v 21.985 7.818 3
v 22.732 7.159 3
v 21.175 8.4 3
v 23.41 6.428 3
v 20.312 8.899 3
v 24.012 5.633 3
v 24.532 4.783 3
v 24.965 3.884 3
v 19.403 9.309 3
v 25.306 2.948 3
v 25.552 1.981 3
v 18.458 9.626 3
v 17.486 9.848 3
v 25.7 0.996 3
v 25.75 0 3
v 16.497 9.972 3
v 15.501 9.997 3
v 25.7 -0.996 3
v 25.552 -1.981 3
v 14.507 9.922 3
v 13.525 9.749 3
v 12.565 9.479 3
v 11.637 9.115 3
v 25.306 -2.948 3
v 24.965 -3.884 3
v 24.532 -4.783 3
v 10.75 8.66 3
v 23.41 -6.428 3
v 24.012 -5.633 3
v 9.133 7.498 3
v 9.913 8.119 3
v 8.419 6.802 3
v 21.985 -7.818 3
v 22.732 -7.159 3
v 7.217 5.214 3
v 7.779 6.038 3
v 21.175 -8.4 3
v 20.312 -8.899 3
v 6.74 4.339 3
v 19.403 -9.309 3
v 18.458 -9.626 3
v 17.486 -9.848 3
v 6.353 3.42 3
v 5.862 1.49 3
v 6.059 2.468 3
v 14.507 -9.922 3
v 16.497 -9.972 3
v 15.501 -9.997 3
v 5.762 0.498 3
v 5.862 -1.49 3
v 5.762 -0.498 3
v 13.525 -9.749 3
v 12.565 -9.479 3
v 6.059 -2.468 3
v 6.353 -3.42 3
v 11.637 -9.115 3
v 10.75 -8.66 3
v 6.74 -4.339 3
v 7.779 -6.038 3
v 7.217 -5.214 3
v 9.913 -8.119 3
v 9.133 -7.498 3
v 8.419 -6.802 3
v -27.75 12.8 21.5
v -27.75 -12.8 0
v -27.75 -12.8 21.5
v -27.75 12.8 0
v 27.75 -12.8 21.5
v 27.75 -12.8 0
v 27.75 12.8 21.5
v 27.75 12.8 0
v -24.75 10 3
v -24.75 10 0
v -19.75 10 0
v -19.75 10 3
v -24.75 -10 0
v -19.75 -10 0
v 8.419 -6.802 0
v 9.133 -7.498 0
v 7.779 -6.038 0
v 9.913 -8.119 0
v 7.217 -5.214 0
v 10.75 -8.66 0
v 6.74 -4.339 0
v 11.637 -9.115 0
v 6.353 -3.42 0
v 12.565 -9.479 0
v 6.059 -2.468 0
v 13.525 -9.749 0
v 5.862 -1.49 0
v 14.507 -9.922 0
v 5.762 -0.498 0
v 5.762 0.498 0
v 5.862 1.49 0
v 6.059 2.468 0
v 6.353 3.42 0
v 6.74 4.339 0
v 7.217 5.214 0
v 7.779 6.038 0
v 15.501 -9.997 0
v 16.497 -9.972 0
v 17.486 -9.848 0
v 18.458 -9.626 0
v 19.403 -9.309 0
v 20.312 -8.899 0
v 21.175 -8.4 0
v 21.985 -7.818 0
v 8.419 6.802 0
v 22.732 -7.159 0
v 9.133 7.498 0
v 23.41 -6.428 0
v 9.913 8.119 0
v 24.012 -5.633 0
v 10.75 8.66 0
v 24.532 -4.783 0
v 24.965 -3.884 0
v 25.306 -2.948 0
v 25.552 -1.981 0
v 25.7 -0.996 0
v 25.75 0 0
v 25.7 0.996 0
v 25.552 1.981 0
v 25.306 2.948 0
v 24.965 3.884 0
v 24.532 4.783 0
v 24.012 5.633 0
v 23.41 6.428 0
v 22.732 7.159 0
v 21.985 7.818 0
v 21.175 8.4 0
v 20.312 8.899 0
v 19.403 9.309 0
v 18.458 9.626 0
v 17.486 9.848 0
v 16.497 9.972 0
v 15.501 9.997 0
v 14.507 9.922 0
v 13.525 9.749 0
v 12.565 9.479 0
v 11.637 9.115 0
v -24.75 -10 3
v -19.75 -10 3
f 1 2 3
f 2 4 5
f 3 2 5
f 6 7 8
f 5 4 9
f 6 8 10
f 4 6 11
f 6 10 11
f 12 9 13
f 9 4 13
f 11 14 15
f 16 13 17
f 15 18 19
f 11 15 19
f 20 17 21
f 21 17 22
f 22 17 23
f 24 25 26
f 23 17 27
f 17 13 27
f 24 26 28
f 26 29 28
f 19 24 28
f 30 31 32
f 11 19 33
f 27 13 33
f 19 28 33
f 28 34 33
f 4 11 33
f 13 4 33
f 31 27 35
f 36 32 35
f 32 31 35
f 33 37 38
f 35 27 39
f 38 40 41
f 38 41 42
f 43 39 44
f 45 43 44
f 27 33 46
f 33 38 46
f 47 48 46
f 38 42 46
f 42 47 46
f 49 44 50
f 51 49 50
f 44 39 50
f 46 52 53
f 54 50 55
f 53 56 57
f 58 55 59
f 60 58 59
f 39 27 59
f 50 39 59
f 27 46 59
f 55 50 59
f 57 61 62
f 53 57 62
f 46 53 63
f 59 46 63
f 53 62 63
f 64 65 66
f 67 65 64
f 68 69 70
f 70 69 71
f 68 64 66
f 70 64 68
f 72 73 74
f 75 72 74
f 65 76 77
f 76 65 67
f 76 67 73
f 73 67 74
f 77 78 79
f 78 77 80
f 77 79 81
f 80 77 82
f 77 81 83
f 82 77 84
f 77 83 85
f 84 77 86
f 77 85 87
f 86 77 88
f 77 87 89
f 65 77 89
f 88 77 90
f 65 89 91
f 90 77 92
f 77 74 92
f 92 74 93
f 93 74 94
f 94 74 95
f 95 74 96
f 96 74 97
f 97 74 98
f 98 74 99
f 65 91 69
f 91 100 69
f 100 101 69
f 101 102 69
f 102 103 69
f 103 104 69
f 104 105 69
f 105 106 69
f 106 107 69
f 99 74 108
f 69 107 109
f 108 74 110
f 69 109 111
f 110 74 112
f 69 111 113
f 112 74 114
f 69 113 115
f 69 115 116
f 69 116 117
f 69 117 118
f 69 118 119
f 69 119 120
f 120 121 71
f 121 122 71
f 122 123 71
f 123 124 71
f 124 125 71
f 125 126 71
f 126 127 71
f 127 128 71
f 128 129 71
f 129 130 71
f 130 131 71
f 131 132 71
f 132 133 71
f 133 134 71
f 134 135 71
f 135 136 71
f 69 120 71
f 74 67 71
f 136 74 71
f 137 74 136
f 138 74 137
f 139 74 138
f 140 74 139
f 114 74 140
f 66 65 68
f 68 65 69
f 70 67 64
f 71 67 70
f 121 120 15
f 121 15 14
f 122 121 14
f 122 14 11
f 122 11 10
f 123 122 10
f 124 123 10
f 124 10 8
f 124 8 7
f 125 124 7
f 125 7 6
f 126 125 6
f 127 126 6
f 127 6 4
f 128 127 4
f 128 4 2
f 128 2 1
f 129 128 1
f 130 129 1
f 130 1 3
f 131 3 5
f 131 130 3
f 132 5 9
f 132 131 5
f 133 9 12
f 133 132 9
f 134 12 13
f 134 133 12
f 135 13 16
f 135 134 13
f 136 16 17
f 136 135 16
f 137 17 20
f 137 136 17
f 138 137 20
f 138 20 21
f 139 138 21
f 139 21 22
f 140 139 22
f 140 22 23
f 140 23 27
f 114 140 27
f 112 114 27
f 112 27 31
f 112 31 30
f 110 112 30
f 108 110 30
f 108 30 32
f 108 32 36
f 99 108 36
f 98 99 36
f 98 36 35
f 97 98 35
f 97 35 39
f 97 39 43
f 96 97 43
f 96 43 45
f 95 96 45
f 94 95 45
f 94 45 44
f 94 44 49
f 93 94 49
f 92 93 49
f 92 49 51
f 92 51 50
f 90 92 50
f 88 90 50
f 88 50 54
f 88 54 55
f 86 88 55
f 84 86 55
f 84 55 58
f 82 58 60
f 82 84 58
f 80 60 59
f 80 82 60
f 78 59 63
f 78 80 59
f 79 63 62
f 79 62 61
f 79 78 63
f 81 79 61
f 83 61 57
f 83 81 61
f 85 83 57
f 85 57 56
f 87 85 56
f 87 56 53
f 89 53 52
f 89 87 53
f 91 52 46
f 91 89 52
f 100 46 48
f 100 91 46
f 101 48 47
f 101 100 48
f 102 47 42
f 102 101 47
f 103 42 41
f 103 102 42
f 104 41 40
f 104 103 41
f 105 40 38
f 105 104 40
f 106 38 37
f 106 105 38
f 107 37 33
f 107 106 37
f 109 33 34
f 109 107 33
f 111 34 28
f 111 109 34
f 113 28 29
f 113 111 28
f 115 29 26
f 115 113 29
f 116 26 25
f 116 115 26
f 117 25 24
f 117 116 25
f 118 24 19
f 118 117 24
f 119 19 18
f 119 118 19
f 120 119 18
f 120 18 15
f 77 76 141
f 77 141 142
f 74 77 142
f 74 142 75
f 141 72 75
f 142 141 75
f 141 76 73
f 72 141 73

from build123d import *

# Parameters (mm, degrees)
SKETCH1_W           = 55.5
SKETCH1_H           = 25.6
SKETCH1_R           = 10
SKETCH1_W_2         = 5
SKETCH1_H_2         = 20
BOSS_EXTRUDE1_DEPTH = 21.5
BOSS_EXTRUDE2_START = 3
SKETCH1_2_W         = 5
SKETCH1_2_H         = 20
SKETCH1_2_R         = 10
BOSS_EXTRUDE2_DEPTH = 18.5


with BuildPart() as part:
    # Sketch1 → Boss-Extrude1 (new body)
    with BuildSketch(Plane.XY):
        Rectangle(SKETCH1_W, SKETCH1_H)
        with Locations((15.75, 0)):
            Circle(SKETCH1_R, mode=Mode.SUBTRACT)
        with Locations((-22.25, 0)):
            Rectangle(SKETCH1_W_2, SKETCH1_H_2, mode=Mode.SUBTRACT)
    extrude(amount=BOSS_EXTRUDE1_DEPTH)

    # Sketch1<2> → Boss-Extrude2 (add)
    with BuildSketch(Plane.XY.offset(BOSS_EXTRUDE2_START)):
        with Locations((-22.25, 0)):
            Rectangle(SKETCH1_2_W, SKETCH1_2_H)
        with Locations(Location((15.75, 0, 0), (0, 0, 180))):
            Circle(SKETCH1_2_R)
    extrude(amount=BOSS_EXTRUDE2_DEPTH)


solid = part.part
